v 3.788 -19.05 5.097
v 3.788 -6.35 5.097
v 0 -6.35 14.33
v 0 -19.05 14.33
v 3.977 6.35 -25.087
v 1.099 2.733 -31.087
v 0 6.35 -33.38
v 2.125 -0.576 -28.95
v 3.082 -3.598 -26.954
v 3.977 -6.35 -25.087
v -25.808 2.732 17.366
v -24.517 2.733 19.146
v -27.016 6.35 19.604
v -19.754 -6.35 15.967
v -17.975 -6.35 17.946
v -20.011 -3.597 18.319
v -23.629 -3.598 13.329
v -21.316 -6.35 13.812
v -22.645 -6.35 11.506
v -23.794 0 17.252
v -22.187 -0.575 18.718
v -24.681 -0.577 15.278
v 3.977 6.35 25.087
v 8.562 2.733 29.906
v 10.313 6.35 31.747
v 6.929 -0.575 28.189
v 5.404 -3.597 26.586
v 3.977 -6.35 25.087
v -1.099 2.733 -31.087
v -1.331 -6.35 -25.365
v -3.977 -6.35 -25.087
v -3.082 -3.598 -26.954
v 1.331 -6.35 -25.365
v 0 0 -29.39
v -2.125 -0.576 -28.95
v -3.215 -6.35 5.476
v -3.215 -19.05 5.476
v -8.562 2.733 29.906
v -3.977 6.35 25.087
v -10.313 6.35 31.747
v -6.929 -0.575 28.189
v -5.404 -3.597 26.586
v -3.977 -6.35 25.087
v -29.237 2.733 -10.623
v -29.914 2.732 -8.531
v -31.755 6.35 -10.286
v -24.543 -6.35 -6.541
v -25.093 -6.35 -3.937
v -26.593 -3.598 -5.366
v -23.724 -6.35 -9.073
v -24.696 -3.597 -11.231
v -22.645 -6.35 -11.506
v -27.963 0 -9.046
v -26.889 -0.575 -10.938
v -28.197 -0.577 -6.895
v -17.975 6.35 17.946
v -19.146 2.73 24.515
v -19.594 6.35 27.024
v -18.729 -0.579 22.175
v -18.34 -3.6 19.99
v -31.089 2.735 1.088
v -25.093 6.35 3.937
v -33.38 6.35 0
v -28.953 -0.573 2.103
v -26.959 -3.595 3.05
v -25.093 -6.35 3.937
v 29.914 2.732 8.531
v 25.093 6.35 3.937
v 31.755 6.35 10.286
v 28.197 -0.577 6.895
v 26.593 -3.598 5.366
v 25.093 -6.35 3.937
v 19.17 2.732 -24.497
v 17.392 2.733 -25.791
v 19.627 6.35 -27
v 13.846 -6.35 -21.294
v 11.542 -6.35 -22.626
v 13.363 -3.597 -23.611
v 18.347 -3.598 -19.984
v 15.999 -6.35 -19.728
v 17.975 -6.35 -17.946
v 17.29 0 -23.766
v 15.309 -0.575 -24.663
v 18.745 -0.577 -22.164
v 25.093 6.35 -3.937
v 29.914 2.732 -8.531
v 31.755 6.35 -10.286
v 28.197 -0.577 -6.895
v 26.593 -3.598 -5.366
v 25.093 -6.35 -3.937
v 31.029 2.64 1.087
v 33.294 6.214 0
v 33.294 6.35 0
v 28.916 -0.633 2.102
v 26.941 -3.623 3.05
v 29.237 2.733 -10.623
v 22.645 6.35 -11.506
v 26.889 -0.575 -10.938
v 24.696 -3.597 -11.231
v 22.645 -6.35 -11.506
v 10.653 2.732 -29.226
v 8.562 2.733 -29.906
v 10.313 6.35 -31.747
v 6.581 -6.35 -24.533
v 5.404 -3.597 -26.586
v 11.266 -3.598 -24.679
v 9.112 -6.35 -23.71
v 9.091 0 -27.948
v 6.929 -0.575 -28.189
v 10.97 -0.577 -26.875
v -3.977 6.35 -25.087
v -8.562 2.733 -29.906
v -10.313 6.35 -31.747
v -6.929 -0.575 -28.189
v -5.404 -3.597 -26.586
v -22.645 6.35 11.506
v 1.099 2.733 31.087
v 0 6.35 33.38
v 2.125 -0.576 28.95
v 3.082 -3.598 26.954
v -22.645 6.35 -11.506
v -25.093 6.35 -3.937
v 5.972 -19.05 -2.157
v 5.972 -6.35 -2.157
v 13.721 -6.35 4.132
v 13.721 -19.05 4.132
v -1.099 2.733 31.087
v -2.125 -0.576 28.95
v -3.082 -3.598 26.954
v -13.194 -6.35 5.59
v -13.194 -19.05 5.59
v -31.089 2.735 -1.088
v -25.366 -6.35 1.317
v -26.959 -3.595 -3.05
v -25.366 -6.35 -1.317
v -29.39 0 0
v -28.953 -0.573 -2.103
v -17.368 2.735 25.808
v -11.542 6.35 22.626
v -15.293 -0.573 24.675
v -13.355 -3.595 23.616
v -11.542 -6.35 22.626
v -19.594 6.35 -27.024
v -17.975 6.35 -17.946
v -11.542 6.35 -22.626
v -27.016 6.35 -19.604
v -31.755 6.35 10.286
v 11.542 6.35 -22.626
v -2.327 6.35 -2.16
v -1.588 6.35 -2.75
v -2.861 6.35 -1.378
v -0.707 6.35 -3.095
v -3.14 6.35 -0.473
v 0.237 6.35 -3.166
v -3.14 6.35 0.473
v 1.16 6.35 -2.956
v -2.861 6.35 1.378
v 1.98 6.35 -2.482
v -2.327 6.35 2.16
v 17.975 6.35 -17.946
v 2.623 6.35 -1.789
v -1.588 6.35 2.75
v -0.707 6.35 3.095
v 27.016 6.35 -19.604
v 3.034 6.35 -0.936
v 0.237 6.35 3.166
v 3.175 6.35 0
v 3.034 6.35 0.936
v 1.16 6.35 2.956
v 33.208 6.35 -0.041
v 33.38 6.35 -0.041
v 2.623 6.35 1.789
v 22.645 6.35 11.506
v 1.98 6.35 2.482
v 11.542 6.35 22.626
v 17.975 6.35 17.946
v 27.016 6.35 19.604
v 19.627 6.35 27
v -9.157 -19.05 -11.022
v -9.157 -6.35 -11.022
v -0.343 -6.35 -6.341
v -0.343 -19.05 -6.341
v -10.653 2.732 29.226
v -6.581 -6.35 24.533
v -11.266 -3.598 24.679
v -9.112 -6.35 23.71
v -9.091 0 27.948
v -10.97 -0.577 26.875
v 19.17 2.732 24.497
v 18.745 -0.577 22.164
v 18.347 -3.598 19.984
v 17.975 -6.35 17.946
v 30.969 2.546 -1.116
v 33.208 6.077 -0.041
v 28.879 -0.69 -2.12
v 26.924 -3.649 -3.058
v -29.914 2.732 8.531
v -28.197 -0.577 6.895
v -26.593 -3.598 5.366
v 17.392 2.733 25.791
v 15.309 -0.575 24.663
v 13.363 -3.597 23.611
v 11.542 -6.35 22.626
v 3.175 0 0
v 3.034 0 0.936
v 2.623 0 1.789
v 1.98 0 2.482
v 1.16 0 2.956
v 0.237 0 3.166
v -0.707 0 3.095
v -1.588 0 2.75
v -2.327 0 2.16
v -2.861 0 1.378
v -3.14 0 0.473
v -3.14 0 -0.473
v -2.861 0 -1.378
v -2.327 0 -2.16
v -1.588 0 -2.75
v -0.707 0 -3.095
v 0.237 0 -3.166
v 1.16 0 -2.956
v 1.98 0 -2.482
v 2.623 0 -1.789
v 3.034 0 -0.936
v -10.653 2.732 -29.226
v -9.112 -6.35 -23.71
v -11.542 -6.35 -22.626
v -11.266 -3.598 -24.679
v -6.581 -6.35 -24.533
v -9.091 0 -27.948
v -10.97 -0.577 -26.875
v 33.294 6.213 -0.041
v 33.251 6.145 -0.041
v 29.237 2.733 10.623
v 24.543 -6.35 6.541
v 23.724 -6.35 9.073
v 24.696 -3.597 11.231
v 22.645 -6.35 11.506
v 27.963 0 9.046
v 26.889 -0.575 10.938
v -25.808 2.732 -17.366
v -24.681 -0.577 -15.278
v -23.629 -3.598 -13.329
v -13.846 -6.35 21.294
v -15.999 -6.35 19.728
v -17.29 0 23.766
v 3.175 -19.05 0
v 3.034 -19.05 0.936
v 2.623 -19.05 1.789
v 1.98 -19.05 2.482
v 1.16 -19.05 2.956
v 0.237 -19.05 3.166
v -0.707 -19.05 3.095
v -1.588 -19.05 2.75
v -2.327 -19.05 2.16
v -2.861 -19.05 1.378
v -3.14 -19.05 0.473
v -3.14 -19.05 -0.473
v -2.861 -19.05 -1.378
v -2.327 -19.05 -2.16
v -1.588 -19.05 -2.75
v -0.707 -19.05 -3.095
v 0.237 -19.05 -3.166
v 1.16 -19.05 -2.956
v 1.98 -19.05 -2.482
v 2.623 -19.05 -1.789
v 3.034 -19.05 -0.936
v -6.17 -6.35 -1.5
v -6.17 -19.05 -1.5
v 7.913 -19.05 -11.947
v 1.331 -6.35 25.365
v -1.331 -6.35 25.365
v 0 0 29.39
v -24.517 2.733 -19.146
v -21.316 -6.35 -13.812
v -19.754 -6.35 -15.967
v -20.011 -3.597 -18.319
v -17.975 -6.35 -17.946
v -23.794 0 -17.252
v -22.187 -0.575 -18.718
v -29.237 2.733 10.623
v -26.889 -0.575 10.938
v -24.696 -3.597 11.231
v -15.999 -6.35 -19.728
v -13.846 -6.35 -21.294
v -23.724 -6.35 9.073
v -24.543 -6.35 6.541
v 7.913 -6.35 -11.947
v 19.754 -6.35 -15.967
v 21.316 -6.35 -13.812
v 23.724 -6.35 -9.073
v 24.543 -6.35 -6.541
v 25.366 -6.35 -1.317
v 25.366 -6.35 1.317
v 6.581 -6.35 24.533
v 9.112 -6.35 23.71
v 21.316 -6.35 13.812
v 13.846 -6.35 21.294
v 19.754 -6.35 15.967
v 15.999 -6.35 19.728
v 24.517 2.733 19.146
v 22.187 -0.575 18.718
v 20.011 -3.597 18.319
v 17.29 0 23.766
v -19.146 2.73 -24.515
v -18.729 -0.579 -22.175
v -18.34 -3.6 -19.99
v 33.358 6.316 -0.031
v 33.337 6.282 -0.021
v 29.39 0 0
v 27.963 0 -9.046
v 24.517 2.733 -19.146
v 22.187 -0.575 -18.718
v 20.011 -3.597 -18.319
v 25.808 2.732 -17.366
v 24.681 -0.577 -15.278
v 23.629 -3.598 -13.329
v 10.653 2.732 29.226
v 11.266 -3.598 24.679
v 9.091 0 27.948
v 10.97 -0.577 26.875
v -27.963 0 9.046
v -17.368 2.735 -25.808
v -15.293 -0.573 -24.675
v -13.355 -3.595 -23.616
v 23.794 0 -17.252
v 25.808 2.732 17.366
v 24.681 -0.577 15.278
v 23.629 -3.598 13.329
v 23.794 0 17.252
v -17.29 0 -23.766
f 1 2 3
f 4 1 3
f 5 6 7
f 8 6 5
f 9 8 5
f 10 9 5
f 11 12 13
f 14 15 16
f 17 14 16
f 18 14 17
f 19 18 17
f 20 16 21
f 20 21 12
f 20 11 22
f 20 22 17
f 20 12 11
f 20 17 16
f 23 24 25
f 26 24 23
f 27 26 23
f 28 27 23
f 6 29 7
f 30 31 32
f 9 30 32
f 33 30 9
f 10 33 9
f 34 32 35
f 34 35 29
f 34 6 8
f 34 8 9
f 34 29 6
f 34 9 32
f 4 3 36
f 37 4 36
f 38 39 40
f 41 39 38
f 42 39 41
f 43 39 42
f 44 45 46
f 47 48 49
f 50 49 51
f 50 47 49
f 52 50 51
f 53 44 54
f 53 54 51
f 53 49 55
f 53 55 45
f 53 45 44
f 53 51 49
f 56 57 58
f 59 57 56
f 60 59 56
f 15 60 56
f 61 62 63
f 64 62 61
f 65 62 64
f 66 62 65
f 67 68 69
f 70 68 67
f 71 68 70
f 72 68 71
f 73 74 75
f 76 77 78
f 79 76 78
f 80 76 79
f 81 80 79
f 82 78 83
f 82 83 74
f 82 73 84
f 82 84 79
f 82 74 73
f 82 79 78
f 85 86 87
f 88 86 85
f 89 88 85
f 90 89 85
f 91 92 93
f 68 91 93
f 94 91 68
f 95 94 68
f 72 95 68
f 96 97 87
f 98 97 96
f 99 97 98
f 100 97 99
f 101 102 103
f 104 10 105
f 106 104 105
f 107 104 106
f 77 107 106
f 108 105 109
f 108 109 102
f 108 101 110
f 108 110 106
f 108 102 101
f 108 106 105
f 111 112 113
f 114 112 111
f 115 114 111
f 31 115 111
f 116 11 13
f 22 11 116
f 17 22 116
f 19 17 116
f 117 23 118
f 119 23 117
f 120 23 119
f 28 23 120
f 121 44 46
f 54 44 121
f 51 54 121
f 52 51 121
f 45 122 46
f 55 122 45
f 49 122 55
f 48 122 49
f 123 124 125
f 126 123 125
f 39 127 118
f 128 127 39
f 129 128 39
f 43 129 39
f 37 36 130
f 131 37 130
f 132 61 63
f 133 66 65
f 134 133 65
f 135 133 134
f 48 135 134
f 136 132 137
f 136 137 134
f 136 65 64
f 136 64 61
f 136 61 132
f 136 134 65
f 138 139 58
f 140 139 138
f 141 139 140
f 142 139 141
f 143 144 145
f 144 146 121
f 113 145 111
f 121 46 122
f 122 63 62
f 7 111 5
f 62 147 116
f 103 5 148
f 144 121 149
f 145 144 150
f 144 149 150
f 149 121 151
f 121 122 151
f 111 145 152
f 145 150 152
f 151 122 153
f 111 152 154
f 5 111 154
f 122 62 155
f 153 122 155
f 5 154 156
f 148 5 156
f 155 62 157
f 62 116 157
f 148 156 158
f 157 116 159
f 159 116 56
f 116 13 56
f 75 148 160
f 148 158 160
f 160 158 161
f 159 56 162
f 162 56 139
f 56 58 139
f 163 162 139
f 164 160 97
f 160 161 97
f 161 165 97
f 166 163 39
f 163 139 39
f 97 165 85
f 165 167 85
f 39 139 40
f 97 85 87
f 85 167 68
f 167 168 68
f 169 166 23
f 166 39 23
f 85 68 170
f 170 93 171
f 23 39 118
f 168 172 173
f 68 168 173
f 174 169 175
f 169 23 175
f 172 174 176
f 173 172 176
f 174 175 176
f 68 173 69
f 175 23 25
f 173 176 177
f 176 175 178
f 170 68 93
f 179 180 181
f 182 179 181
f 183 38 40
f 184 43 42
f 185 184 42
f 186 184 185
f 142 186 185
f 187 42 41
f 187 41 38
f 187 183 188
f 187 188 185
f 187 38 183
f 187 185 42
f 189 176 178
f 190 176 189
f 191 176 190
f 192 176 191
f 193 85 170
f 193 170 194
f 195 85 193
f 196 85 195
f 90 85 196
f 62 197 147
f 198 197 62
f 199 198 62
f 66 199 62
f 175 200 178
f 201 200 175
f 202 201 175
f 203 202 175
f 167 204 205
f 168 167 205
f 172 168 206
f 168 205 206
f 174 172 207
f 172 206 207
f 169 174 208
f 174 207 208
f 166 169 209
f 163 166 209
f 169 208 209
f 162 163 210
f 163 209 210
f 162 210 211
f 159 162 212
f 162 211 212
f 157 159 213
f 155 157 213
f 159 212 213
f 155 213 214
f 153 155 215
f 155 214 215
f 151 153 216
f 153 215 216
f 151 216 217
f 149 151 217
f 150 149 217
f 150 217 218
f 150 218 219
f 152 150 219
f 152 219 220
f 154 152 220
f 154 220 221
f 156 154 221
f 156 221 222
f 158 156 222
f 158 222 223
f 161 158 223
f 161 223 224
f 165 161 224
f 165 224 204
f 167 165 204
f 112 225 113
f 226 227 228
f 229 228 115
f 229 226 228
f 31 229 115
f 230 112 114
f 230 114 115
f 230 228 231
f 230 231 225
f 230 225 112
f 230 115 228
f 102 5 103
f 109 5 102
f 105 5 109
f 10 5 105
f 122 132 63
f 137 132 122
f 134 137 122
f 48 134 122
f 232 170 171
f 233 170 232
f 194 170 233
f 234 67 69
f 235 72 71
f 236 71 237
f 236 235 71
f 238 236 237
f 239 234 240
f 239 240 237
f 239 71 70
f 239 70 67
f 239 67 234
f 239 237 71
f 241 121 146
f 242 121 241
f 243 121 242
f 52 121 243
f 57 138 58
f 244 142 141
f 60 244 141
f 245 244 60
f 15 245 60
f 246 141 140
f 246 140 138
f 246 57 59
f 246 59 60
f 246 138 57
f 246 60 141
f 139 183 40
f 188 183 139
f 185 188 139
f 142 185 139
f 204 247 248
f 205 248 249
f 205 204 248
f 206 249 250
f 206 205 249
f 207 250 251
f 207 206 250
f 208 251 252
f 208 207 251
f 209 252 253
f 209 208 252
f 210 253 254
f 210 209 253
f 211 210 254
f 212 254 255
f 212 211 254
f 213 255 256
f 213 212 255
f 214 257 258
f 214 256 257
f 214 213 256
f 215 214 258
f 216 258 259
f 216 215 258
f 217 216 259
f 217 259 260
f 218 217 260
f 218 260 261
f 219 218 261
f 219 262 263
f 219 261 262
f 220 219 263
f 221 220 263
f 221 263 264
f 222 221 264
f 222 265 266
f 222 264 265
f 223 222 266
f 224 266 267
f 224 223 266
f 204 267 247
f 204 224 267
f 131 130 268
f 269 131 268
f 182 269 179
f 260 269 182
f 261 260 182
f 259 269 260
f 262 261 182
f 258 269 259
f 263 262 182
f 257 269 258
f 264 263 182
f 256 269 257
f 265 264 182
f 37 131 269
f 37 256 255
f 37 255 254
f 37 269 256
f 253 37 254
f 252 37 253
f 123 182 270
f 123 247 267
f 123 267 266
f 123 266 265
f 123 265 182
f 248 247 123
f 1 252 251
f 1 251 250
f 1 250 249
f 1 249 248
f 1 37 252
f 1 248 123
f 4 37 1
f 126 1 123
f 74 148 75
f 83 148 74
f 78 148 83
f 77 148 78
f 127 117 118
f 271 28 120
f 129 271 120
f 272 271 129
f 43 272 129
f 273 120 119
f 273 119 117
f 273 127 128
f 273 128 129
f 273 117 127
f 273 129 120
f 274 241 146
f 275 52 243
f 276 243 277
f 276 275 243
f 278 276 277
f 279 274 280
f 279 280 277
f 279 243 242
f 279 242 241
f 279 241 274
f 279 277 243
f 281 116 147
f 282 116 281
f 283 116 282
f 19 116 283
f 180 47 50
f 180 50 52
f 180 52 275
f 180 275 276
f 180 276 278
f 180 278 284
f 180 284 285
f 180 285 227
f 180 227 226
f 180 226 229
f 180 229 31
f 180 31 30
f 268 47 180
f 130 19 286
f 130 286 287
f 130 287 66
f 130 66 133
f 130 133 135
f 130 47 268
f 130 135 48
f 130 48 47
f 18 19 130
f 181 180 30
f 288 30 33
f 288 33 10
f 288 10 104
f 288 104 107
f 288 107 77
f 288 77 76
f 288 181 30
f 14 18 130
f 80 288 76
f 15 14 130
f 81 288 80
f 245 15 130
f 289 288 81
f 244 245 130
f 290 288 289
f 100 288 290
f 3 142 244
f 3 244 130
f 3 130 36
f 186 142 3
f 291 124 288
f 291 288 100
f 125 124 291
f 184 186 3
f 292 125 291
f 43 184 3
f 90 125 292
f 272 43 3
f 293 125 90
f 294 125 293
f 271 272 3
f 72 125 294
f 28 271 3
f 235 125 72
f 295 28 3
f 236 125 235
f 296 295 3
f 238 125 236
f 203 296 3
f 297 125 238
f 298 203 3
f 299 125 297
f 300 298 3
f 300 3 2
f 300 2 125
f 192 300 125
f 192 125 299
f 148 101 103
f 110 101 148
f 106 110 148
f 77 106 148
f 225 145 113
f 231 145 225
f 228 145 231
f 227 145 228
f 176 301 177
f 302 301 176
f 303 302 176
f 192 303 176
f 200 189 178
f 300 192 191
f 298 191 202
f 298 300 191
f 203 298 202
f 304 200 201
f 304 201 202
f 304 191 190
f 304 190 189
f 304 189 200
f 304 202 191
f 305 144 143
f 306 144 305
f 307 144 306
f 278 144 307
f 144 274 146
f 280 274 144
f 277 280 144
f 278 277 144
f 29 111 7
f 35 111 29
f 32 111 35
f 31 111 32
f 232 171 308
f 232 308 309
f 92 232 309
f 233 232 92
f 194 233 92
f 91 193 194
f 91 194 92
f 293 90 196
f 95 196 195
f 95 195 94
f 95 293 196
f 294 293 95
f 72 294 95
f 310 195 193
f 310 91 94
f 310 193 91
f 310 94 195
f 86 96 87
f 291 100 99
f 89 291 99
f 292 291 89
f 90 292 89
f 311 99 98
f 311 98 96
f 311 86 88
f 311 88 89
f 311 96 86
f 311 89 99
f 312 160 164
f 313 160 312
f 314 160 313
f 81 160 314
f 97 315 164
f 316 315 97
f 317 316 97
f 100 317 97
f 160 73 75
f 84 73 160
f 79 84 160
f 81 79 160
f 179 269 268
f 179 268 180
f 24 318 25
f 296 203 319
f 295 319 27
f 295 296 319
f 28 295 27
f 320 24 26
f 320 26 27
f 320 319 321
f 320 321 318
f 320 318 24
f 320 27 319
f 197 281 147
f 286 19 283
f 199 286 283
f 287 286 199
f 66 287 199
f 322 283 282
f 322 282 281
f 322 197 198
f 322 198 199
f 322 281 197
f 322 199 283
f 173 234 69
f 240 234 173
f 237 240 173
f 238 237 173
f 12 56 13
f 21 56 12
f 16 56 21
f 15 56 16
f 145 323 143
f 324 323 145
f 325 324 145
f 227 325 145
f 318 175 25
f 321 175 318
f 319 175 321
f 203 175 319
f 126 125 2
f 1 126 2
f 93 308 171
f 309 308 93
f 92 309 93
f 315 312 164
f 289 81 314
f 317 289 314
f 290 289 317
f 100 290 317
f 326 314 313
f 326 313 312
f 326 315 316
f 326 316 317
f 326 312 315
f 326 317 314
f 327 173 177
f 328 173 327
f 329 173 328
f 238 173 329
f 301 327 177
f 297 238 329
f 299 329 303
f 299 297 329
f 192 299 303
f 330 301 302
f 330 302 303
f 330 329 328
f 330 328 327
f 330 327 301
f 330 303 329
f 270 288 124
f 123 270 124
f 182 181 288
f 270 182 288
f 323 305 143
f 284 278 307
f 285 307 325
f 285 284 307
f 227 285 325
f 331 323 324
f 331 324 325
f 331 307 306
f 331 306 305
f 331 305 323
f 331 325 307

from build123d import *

# Parameters (mm, degrees)
F1_DEPTH = 6.35
F6_DEPTH = 12.7
F5_R     = 3.175
F7_DEPTH = 63.5


with BuildPart() as f1:
    # F0 (on Front) → F1 (new body, symmetric)
    with BuildSketch(Plane.XZ):
        with BuildLine():
            ThreePointArc((25.3999666944, -0.0411329817), (25.3999916736, -0.0205664976), (25.4, 0))
            ThreePointArc((25.4, 0), (25.3231458192, 1.9744077138), (25.0930483606, 3.9368672789))
            ThreePointArc((25.0930483606, 3.9368672789), (24.706334539, 5.8955096173), (24.1669838755, 7.8177292331))
            Line((24.1669838755, 7.8177292331), (0.0326778328, -0.0326249568))
            Line((0.0326778328, -0.0326249568), (0.0299255888, -0.0411329817))
            Line((0.0299255888, -0.0411329817), (25.3999666944, -0.0411329817))
        make_face()
        with BuildLine():
            ThreePointArc((25.0930483606, 3.9368672789), (25.3231458192, 1.9744077138), (25.4, 0))
            ThreePointArc((25.4, 0), (25.3999916736, -0.0205664976), (25.3999666944, -0.0411329817))
            Line((25.3999666944, -0.0411329817), (33.2082439851, -0.0411329817))
            Line((33.2082439851, -0.0411329817), (33.2939280097, 0))
            Line((33.2939280097, 0), (25.0930483606, 3.9368672789))
        make_face()
        with BuildLine():
            ThreePointArc((24.1669838755, 7.8177292331), (24.706334539, 5.8955096173), (25.0930483606, 3.9368672789))
            Line((25.0930483606, 3.9368672789), (31.7552785313, 10.2860330974))
            Line((31.7552785313, 10.2860330974), (24.1669838755, 7.8177292331))
        make_face()
        with BuildLine():
            Line((33.2082439851, -0.0411329817), (25.3999666944, -0.0411329817))
            ThreePointArc((25.3999666944, -0.0411329817), (25.3215388309, -1.994911335), (25.0930483606, -3.9368672789))
            Line((25.0930483606, -3.9368672789), (33.2082439851, -0.0411329817))
        make_face()
        with BuildLine():
            ThreePointArc((25.0930483606, -3.9368672789), (25.3215388309, -1.994911335), (25.3999666944, -0.0411329817))
            Line((25.3999666944, -0.0411329817), (0.0299255888, -0.0411329817))
            Line((0.0299255888, -0.0411329817), (0.0264556072, -0.0518597526))
            Line((0.0264556072, -0.0518597526), (24.1415369557, -7.895960576))
            ThreePointArc((24.1415369557, -7.895960576), (24.6967549032, -5.9355115407), (25.0930483606, -3.9368672789))
        make_face()
        with BuildLine():
            Line((0.0326778328, -0.0326249568), (24.1669838755, 7.8177292331))
            ThreePointArc((24.1669838755, 7.8177292331), (23.4783285027, 9.6916505673), (22.6446229644, 11.5056964501))
            ThreePointArc((22.6446229644, 11.5056964501), (21.6710179307, 13.2486596246), (20.5635283771, 14.9097719863))
            Line((20.5635283771, 14.9097719863), (0.0350181754, -0.0253902444))
            Line((0.0350181754, -0.0253902444), (0.0326778328, -0.0326249568))
        make_face()
        with BuildLine():
            ThreePointArc((22.6446229644, 11.5056964501), (23.4783285027, 9.6916505673), (24.1669838755, 7.8177292331))
            Line((24.1669838755, 7.8177292331), (31.7552785313, 10.2860330974))
            Line((31.7552785313, 10.2860330974), (22.6446229644, 11.5056964501))
        make_face()
        Polygon((33.3796120343, -0.0411329817), (33.2939280097, 0), (33.2082439851, -0.0411329817), align=None)
        with BuildLine():
            Line((31.7552785313, -10.2860330974), (25.0930483606, -3.9368672789))
            ThreePointArc((25.0930483606, -3.9368672789), (24.6967549032, -5.9355115407), (24.1415369557, -7.895960576))
            ThreePointArc((24.1415369557, -7.895960576), (23.4626029734, -9.7296588694), (22.6446229644, -11.5056964501))
            Line((22.6446229644, -11.5056964501), (31.7552785313, -10.2860330974))
        make_face()
        with BuildLine():
            ThreePointArc((20.5635283771, 14.9097719863), (21.6710179307, 13.2486596246), (22.6446229644, 11.5056964501))
            Line((22.6446229644, 11.5056964501), (27.0161574965, 19.6042705962))
            Line((27.0161574965, 19.6042705962), (20.5635283771, 14.9097719863))
        make_face()
        with BuildLine():
            ThreePointArc((22.6446229644, -11.5056964501), (23.4626029734, -9.7296588694), (24.1415369557, -7.895960576))
            Line((24.1415369557, -7.895960576), (0.0264556072, -0.0518597526))
            Line((0.0264556072, -0.0518597526), (0.0216754409, -0.0666367035))
            Line((0.0216754409, -0.0666367035), (20.5151305555, -14.9762952125))
            ThreePointArc((20.5151305555, -14.9762952125), (21.6495345196, -13.283736488), (22.6446229644, -11.5056964501))
        make_face()
        with BuildLine():
            Line((0.0350181754, -0.0253902444), (20.5635283771, 14.9097719863))
            ThreePointArc((20.5635283771, 14.9097719863), (19.3289964238, 16.4787711086), (17.9750490644, 17.9459636446))
            ThreePointArc((17.9750490644, 17.9459636446), (16.5100510465, 19.302285213), (14.9430531934, 20.5393563984))
            Line((14.9430531934, 20.5393563984), (0.0371289603, -0.0188651649))
            Line((0.0371289603, -0.0188651649), (0.0350181754, -0.0253902444))
        make_face()
        with BuildLine():
            ThreePointArc((17.9750490644, 17.9459636446), (19.3289964238, 16.4787711086), (20.5635283771, 14.9097719863))
            Line((20.5635283771, 14.9097719863), (27.0161574965, 19.6042705962))
            Line((27.0161574965, 19.6042705962), (17.9750490644, 17.9459636446))
        make_face()
        with BuildLine():
            Line((27.0161574965, -19.6042705962), (22.6446229644, -11.5056964501))
            ThreePointArc((22.6446229644, -11.5056964501), (21.6495345196, -13.283736488), (20.5151305555, -14.9762952125))
            ThreePointArc((20.5151305555, -14.9762952125), (19.302285213, -16.5100510465), (17.9750490644, -17.9459636446))
            Line((17.9750490644, -17.9459636446), (27.0161574965, -19.6042705962))
        make_face()
        with BuildLine():
            Line((20.5151305555, -14.9762952125), (0.0216754409, -0.0666367035))
            Line((0.0216754409, -0.0666367035), (0.0142195958, -0.0896849932))
            Line((0.0142195958, -0.0896849932), (14.8764516786, -20.5876464282))
            ThreePointArc((14.8764516786, -20.5876464282), (16.4787711086, -19.3289964238), (17.9750490644, -17.9459636446))
            ThreePointArc((17.9750490644, -17.9459636446), (19.302285213, -16.5100510465), (20.5151305555, -14.9762952125))
        make_face()
        with BuildLine():
            ThreePointArc((14.9430531934, 20.5393563984), (16.5100510465, 19.302285213), (17.9750490644, 17.9459636446))
            Line((17.9750490644, 17.9459636446), (19.6270962066, 26.9995793667))
            Line((19.6270962066, 26.9995793667), (14.9430531934, 20.5393563984))
        make_face()
        with BuildLine():
            Line((0.0294725544, -0.0294248649), (0.0371289603, -0.0188651649))
            Line((0.0371289603, -0.0188651649), (7.8568552068, 24.1542920877))
            ThreePointArc((7.8568552068, 24.1542920877), (5.9355115407, 24.6967549032), (3.9774980183, 25.0866400603))
            ThreePointArc((3.9774980183, 25.0866400603), (1.994911335, 25.3215388309), (0, 25.4))
            Line((0, 25.4), (-0.041143489, -0.006455033))
            Line((-0.041143489, -0.006455033), (-0.0371289603, -0.0188651649))
            Line((-0.0371289603, -0.0188651649), (-0.0294725544, -0.0294248649))
            Line((-0.0294725544, -0.0294248649), (-0.0189252671, -0.0370983612))
            Line((-0.0189252671, -0.0370983612), (-0.0065216527, -0.0411329817))
            Line((-0.0065216527, -0.0411329817), (0.0065216527, -0.0411329817))
            Line((0.0065216527, -0.0411329817), (0.0189252671, -0.0370983612))
            Line((0.0189252671, -0.0370983612), (0.0294725544, -0.0294248649))
        make_face()
        with BuildLine():
            Line((7.8568552068, 24.1542920877), (0.0371289603, -0.0188651649))
            Line((0.0371289603, -0.0188651649), (14.9430531934, 20.5393563984))
            ThreePointArc((14.9430531934, 20.5393563984), (13.283736488, 21.6495345196), (11.5423522634, 22.6259608465))
            ThreePointArc((11.5423522634, 22.6259608465), (9.7296588694, 23.4626029734), (7.8568552068, 24.1542920877))
        make_face()
        with BuildLine():
            Line((14.8764516786, -20.5876464282), (0.0142195958, -0.0896849932))
            Line((0.0142195958, -0.0896849932), (0, -0.133642098))
            Line((0, -0.133642098), (7.7785827575, -24.1796122857))
            ThreePointArc((7.7785827575, -24.1796122857), (9.6916505673, -23.4783285027), (11.5423522634, -22.6259608465))
            ThreePointArc((11.5423522634, -22.6259608465), (13.2486596246, -21.6710179307), (14.8764516786, -20.5876464282))
        make_face()
        with BuildLine():
            ThreePointArc((11.5423522634, 22.6259608465), (13.283736488, 21.6495345196), (14.9430531934, 20.5393563984))
            Line((14.9430531934, 20.5393563984), (19.6270962066, 26.9995793667))
            Line((19.6270962066, 26.9995793667), (11.5423522634, 22.6259608465))
        make_face()
        with BuildLine():
            Line((10.3128672742, 31.7465739895), (7.8568552068, 24.1542920877))
            ThreePointArc((7.8568552068, 24.1542920877), (9.7296588694, 23.4626029734), (11.5423522634, 22.6259608465))
            Line((11.5423522634, 22.6259608465), (10.3128672742, 31.7465739895))
        make_face()
        with BuildLine():
            ThreePointArc((3.9774980183, 25.0866400603), (5.9355115407, 24.6967549032), (7.8568552068, 24.1542920877))
            Line((7.8568552068, 24.1542920877), (10.3128672742, 31.7465739895))
            Line((10.3128672742, 31.7465739895), (3.9774980183, 25.0866400603))
        make_face()
        with BuildLine():
            Line((19.6270962066, -26.9995793667), (17.9750490644, -17.9459636446))
            ThreePointArc((17.9750490644, -17.9459636446), (16.4787711086, -19.3289964238), (14.8764516786, -20.5876464282))
            ThreePointArc((14.8764516786, -20.5876464282), (13.2486596246, -21.6710179307), (11.5423522634, -22.6259608465))
            Line((11.5423522634, -22.6259608465), (19.6270962066, -26.9995793667))
        make_face()
        with BuildLine():
            Line((7.7785827575, -24.1796122857), (0, -0.133642098))
            Line((0, -0.133642098), (-0.0415574978, -0.2621089903))
            Line((-0.0415574978, -0.2621089903), (-0.0822658556, -25.3998667778))
            ThreePointArc((-0.0822658556, -25.3998667778), (1.9539027981, -25.3247362051), (3.9774980183, -25.0866400603))
            ThreePointArc((3.9774980183, -25.0866400603), (5.8955096173, -24.706334539), (7.7785827575, -24.1796122857))
        make_face()
        with BuildLine():
            ThreePointArc((0, 25.4), (1.994911335, 25.3215388309), (3.9774980183, 25.0866400603))
            Line((3.9774980183, 25.0866400603), (0, 33.3796453399))
            Line((0, 33.3796453399), (0, 25.4))
        make_face()
        with BuildLine():
            Line((-7.7785827575, -24.1796122857), (-0.0415574978, -0.2621089903))
            Line((-0.0415574978, -0.2621089903), (-0.041338843, -0.1270878059))
            Line((-0.041338843, -0.1270878059), (-14.8764516786, -20.5876464282))
            ThreePointArc((-14.8764516786, -20.5876464282), (-13.2486596246, -21.6710179307), (-11.5423522634, -22.6259608465))
            ThreePointArc((-11.5423522634, -22.6259608465), (-9.6916505673, -23.4783285027), (-7.7785827575, -24.1796122857))
        make_face()
        with BuildLine():
            Line((-0.0822658556, -25.3998667778), (-0.0415574978, -0.2621089903))
            Line((-0.0415574978, -0.2621089903), (-7.7785827575, -24.1796122857))
            ThreePointArc((-7.7785827575, -24.1796122857), (-5.8955096173, -24.706334539), (-3.9774980183, -25.0866400603))
            ThreePointArc((-3.9774980183, -25.0866400603), (-2.0359146402, -25.3182750514), (-0.0822658556, -25.3998667778))
        make_face()
        with BuildLine():
            ThreePointArc((11.5423522634, -22.6259608465), (9.6916505673, -23.4783285027), (7.7785827575, -24.1796122857))
            ThreePointArc((7.7785827575, -24.1796122857), (5.8955096173, -24.706334539), (3.9774980183, -25.0866400603))
            Line((3.9774980183, -25.0866400603), (10.3128672742, -31.7465739895))
            Line((10.3128672742, -31.7465739895), (11.5423522634, -22.6259608465))
        make_face()
        with BuildLine():
            Line((-0.041143489, -0.006455033), (0, 25.4))
            ThreePointArc((0, 25.4), (-1.994911335, 25.3215388309), (-3.9774980183, 25.0866400603))
            ThreePointArc((-3.9774980183, 25.0866400603), (-5.9355115407, 24.6967549032), (-7.8568552068, 24.1542920877))
            Line((-7.8568552068, 24.1542920877), (-0.041143489, -0.006455033))
        make_face()
        with BuildLine():
            ThreePointArc((-3.9774980183, 25.0866400603), (-1.994911335, 25.3215388309), (0, 25.4))
            Line((0, 25.4), (0, 33.3796453399))
            Line((0, 33.3796453399), (-3.9774980183, 25.0866400603))
        make_face()
        with BuildLine():
            Line((-14.8764516786, -20.5876464282), (-0.041338843, -0.1270878059))
            Line((-0.041338843, -0.1270878059), (-0.0412640266, -0.08088804))
            Line((-0.0412640266, -0.08088804), (-20.5151305555, -14.9762952125))
            ThreePointArc((-20.5151305555, -14.9762952125), (-19.302285213, -16.5100510465), (-17.9750490644, -17.9459636446))
            ThreePointArc((-17.9750490644, -17.9459636446), (-16.4787711086, -19.3289964238), (-14.8764516786, -20.5876464282))
        make_face()
        with BuildLine():
            ThreePointArc((3.9774980183, -25.0866400603), (1.9539027981, -25.3247362051), (-0.0822658556, -25.3998667778))
            ThreePointArc((-0.0822658556, -25.3998667778), (-2.0359146402, -25.3182750514), (-3.9774980183, -25.0866400603))
            Line((-3.9774980183, -25.0866400603), (0, -33.3796453399))
            Line((0, -33.3796453399), (3.9774980183, -25.0866400603))
        make_face()
        with BuildLine():
            ThreePointArc((-3.9774980183, -25.0866400603), (-5.8955096173, -24.706334539), (-7.7785827575, -24.1796122857))
            ThreePointArc((-7.7785827575, -24.1796122857), (-9.6916505673, -23.4783285027), (-11.5423522634, -22.6259608465))
            Line((-11.5423522634, -22.6259608465), (-10.3128672794, -31.7465739878))
            Line((-10.3128672794, -31.7465739878), (-3.9774980183, -25.0866400603))
        make_face()
        with BuildLine():
            ThreePointArc((-7.8568552068, 24.1542920877), (-5.9355115407, 24.6967549032), (-3.9774980183, 25.0866400603))
            Line((-3.9774980183, 25.0866400603), (-10.3128672794, 31.7465739878))
            Line((-10.3128672794, 31.7465739878), (-7.8568552068, 24.1542920877))
        make_face()
        with BuildLine():
            Line((-0.0411545949, -0.0133130175), (-0.041143489, -0.006455033))
            Line((-0.041143489, -0.006455033), (-7.8568552068, 24.1542920877))
            ThreePointArc((-7.8568552068, 24.1542920877), (-9.7296588694, 23.4626029734), (-11.5423522634, 22.6259608465))
            ThreePointArc((-11.5423522634, 22.6259608465), (-13.283736488, 21.6495345196), (-14.9430531934, 20.5393563984))
            Line((-14.9430531934, 20.5393563984), (-0.0411545949, -0.0133130175))
        make_face()
        with BuildLine():
            Line((-20.5151305555, -14.9762952125), (-0.0412640266, -0.08088804))
            Line((-0.0412640266, -0.08088804), (-0.0412247977, -0.0566638425))
            Line((-0.0412247977, -0.0566638425), (-24.1415369557, -7.895960576))
            ThreePointArc((-24.1415369557, -7.895960576), (-23.4626029734, -9.7296588694), (-22.6446229644, -11.5056964501))
            ThreePointArc((-22.6446229644, -11.5056964501), (-21.6495345196, -13.283736488), (-20.5151305555, -14.9762952125))
        make_face()
        with BuildLine():
            ThreePointArc((-11.5423522634, -22.6259608465), (-13.2486596246, -21.6710179307), (-14.8764516786, -20.5876464282))
            ThreePointArc((-14.8764516786, -20.5876464282), (-16.4787711086, -19.3289964238), (-17.9750490644, -17.9459636446))
            Line((-17.9750490644, -17.9459636446), (-19.5937332182, -27.0236385527))
            Line((-19.5937332182, -27.0236385527), (-11.5423522634, -22.6259608465))
        make_face()
        with BuildLine():
            ThreePointArc((-11.5423522634, 22.6259608465), (-9.7296588694, 23.4626029734), (-7.8568552068, 24.1542920877))
            Line((-7.8568552068, 24.1542920877), (-10.3128672794, 31.7465739878))
            Line((-10.3128672794, 31.7465739878), (-11.5423522634, 22.6259608465))
        make_face()
        with BuildLine():
            Line((-0.0411669086, -0.02091684), (-0.0411545949, -0.0133130175))
            Line((-0.0411545949, -0.0133130175), (-14.9430531934, 20.5393563984))
            ThreePointArc((-14.9430531934, 20.5393563984), (-16.5100510465, 19.302285213), (-17.9750490644, 17.9459636446))
            ThreePointArc((-17.9750490644, 17.9459636446), (-19.3289964238, 16.4787711086), (-20.5635283771, 14.9097719863))
            Line((-20.5635283771, 14.9097719863), (-0.0411669086, -0.02091684))
        make_face()
        with BuildLine():
            Line((-24.1415369557, -7.895960576), (-0.0412247977, -0.0566638425))
            Line((-0.0412247977, -0.0566638425), (-0.0411996469, -0.0411329817))
            Line((-0.0411996469, -0.0411329817), (-25.3999666944, -0.0411329817))
            ThreePointArc((-25.3999666944, -0.0411329817), (-25.3215388309, -1.994911335), (-25.0930483606, -3.9368672789))
            ThreePointArc((-25.0930483606, -3.9368672789), (-24.6967549032, -5.9355115407), (-24.1415369557, -7.895960576))
        make_face()
        with BuildLine():
            ThreePointArc((-17.9750490644, -17.9459636446), (-19.302285213, -16.5100510465), (-20.5151305555, -14.9762952125))
            ThreePointArc((-20.5151305555, -14.9762952125), (-21.6495345196, -13.283736488), (-22.6446229644, -11.5056964501))
            Line((-22.6446229644, -11.5056964501), (-27.0161574965, -19.6042705962))
            Line((-27.0161574965, -19.6042705962), (-17.9750490644, -17.9459636446))
        make_face()
        with BuildLine():
            Line((-25.3999666944, -0.0411329817), (-0.0411996469, -0.0411329817))
            Line((-0.0411996469, -0.0411329817), (-0.0411813896, -0.0298589385))
            Line((-0.0411813896, -0.0298589385), (-24.1669838755, 7.8177292331))
            ThreePointArc((-24.1669838755, 7.8177292331), (-24.706334539, 5.8955096173), (-25.0930483606, 3.9368672789))
            ThreePointArc((-25.0930483606, 3.9368672789), (-25.3247362051, 1.9539027981), (-25.3999666944, -0.0411329817))
        make_face()
        with BuildLine():
            Line((-24.1669838755, 7.8177292331), (-0.0411813896, -0.0298589385))
            Line((-0.0411813896, -0.0298589385), (-0.0411669086, -0.02091684))
            Line((-0.0411669086, -0.02091684), (-20.5635283771, 14.9097719863))
            ThreePointArc((-20.5635283771, 14.9097719863), (-21.6710179307, 13.2486596246), (-22.6446229644, 11.5056964501))
            ThreePointArc((-22.6446229644, 11.5056964501), (-23.4783285027, 9.6916505673), (-24.1669838755, 7.8177292331))
        make_face()
        with BuildLine():
            ThreePointArc((-14.9430531934, 20.5393563984), (-13.283736488, 21.6495345196), (-11.5423522634, 22.6259608465))
            Line((-11.5423522634, 22.6259608465), (-19.5937332182, 27.0236385527))
            Line((-19.5937332182, 27.0236385527), (-14.9430531934, 20.5393563984))
        make_face()
        with BuildLine():
            ThreePointArc((-17.9750490644, 17.9459636446), (-16.5100510465, 19.302285213), (-14.9430531934, 20.5393563984))
            Line((-14.9430531934, 20.5393563984), (-19.5937332182, 27.0236385527))
            Line((-19.5937332182, 27.0236385527), (-17.9750490644, 17.9459636446))
        make_face()
        with BuildLine():
            ThreePointArc((-22.6446229644, -11.5056964501), (-23.4626029734, -9.7296588694), (-24.1415369557, -7.895960576))
            ThreePointArc((-24.1415369557, -7.895960576), (-24.6967549032, -5.9355115407), (-25.0930483606, -3.9368672789))
            Line((-25.0930483606, -3.9368672789), (-31.7552785313, -10.2860330974))
            Line((-31.7552785313, -10.2860330974), (-22.6446229644, -11.5056964501))
        make_face()
        with BuildLine():
            Line((-33.3795060187, 0), (-25.3999666944, -0.0411329817))
            ThreePointArc((-25.3999666944, -0.0411329817), (-25.3247362051, 1.9539027981), (-25.0930483606, 3.9368672789))
            Line((-25.0930483606, 3.9368672789), (-33.3795060187, 0))
        make_face()
        with BuildLine():
            ThreePointArc((-25.0930483606, -3.9368672789), (-25.3215388309, -1.994911335), (-25.3999666944, -0.0411329817))
            Line((-25.3999666944, -0.0411329817), (-33.3795060187, 0))
            Line((-33.3795060187, 0), (-25.0930483606, -3.9368672789))
        make_face()
        with BuildLine():
            Line((-31.7552785313, 10.2860330974), (-24.1669838755, 7.8177292331))
            ThreePointArc((-24.1669838755, 7.8177292331), (-23.4783285027, 9.6916505673), (-22.6446229644, 11.5056964501))
            Line((-22.6446229644, 11.5056964501), (-31.7552785313, 10.2860330974))
        make_face()
        with BuildLine():
            ThreePointArc((-25.0930483606, 3.9368672789), (-24.706334539, 5.8955096173), (-24.1669838755, 7.8177292331))
            Line((-24.1669838755, 7.8177292331), (-31.7552785313, 10.2860330974))
            Line((-31.7552785313, 10.2860330974), (-25.0930483606, 3.9368672789))
        make_face()
        with BuildLine():
            Line((-27.0161574965, 19.6042705962), (-20.5635283771, 14.9097719863))
            ThreePointArc((-20.5635283771, 14.9097719863), (-19.3289964238, 16.4787711086), (-17.9750490644, 17.9459636446))
            Line((-17.9750490644, 17.9459636446), (-27.0161574965, 19.6042705962))
        make_face()
        with BuildLine():
            ThreePointArc((-22.6446229644, 11.5056964501), (-21.6710179307, 13.2486596246), (-20.5635283771, 14.9097719863))
            Line((-20.5635283771, 14.9097719863), (-27.0161574965, 19.6042705962))
            Line((-27.0161574965, 19.6042705962), (-22.6446229644, 11.5056964501))
        make_face()
    extrude(amount=F1_DEPTH, both=True)

    # F2 (on Right) → F3 (revolve, cut)
    with BuildSketch(Plane.YZ):
        Polygon((-6.35, -33.3796453399), (0, -33.3796453399), (6.35, -33.3796453399), (-6.35, -25.4), align=None)
    revolve(axis=Axis((0, -3.175, 0), (0, -1, 0)), mode=Mode.SUBTRACT)

    # F4 (on face) → F6 (join)
    with BuildSketch(Plane.XZ.offset(6.35)):
        with BuildLine():
            ThreePointArc((5.9723219918, -2.1572830195), (6.2548678902, -1.095046883), (6.35, 0))
            ThreePointArc((6.35, 0), (6.282204895, 0.9254197195), (6.0802671946, 1.8310791469))
            Line((6.0802671946, 1.8310791469), (0, 0))
            Line((0, 0), (3.5065985725, -5.2939839867))
            ThreePointArc((3.5065985725, -5.2939839867), (4.9922146394, -3.9243207048), (5.9723219918, -2.1572830195))
        make_face()
        with BuildLine():
            ThreePointArc((6.0802671946, 1.8310791469), (6.282204895, 0.9254197195), (6.35, 0))
            ThreePointArc((6.35, 0), (6.2548678902, -1.095046883), (5.9723219918, -2.1572830195))
            Line((5.9723219918, -2.1572830195), (13.7209562945, 4.1320810653))
            Line((13.7209562945, 4.1320810653), (6.0802671946, 1.8310791469))
        make_face()
        with BuildLine():
            Line((0, 0), (6.0802671946, 1.8310791469))
            ThreePointArc((6.0802671946, 1.8310791469), (5.1971745773, 3.6485444239), (3.787819123, 5.0965602411))
            ThreePointArc((3.787819123, 5.0965602411), (1.994911335, 6.0285013698), (0, 6.35))
            Line((0, 6.35), (0, 0))
        make_face()
        with BuildLine():
            ThreePointArc((3.787819123, 5.0965602411), (5.1971745773, 3.6485444239), (6.0802671946, 1.8310791469))
            Line((6.0802671946, 1.8310791469), (13.7209562945, 4.1320810653))
            Line((13.7209562945, 4.1320810653), (3.787819123, 5.0965602411))
        make_face()
        with BuildLine():
            Line((7.9131202982, -11.9466004668), (5.9723219918, -2.1572830195))
            ThreePointArc((5.9723219918, -2.1572830195), (4.9922146394, -3.9243207048), (3.5065985725, -5.2939839867))
            Line((3.5065985725, -5.2939839867), (7.9131202982, -11.9466004668))
        make_face()
        with BuildLine():
            ThreePointArc((0, 6.35), (1.994911335, 6.0285013698), (3.787819123, 5.0965602411))
            Line((3.787819123, 5.0965602411), (0, 14.3296453399))
            Line((0, 14.3296453399), (0, 6.35))
        make_face()
        with BuildLine():
            Line((-5.8468902963, 2.4771705358), (0, 0))
            Line((0, 0), (0, 6.35))
            ThreePointArc((0, 6.35), (-1.6659063993, 6.1275815677), (-3.2151109751, 5.4759073602))
            ThreePointArc((-3.2151109751, 5.4759073602), (-4.7726378865, 4.188606881), (-5.8468902963, 2.4771705358))
        make_face()
        with BuildLine():
            Line((3.5065985725, -5.2939839867), (0, 0))
            Line((0, 0), (-4.0579492347, -4.8842141649))
            ThreePointArc((-4.0579492347, -4.8842141649), (-2.3180753259, -5.9117701903), (-0.3434744748, -6.3407038478))
            ThreePointArc((-0.3434744748, -6.3407038478), (1.6659063993, -6.1275815677), (3.5065985725, -5.2939839867))
        make_face()
        with BuildLine():
            Line((-4.0579492347, -4.8842141649), (0, 0))
            Line((0, 0), (-5.8468902963, 2.4771705358))
            ThreePointArc((-5.8468902963, 2.4771705358), (-6.3290900379, 0.5148973609), (-6.1704098495, -1.4995140175))
            ThreePointArc((-6.1704098495, -1.4995140175), (-5.3869175937, -3.3620854896), (-4.0579492347, -4.8842141649))
        make_face()
        with BuildLine():
            Line((7.9131202982, -11.9466004668), (3.5065985725, -5.2939839867))
            ThreePointArc((3.5065985725, -5.2939839867), (1.6659063993, -6.1275815677), (-0.3434744748, -6.3407038478))
            Line((-0.3434744748, -6.3407038478), (7.9131202982, -11.9466004668))
        make_face()
        with BuildLine():
            ThreePointArc((-3.2151109751, 5.4759073602), (-1.6659063993, 6.1275815677), (0, 6.35))
            Line((0, 6.35), (0, 14.3296453399))
            Line((0, 14.3296453399), (-3.2151109751, 5.4759073602))
        make_face()
        with BuildLine():
            Line((-9.1573186362, -11.0218987004), (-4.0579492347, -4.8842141649))
            ThreePointArc((-4.0579492347, -4.8842141649), (-5.3869175937, -3.3620854896), (-6.1704098495, -1.4995140175))
            Line((-6.1704098495, -1.4995140175), (-9.1573186362, -11.0218987004))
        make_face()
        with BuildLine():
            ThreePointArc((-0.3434744748, -6.3407038478), (-2.3180753259, -5.9117701903), (-4.0579492347, -4.8842141649))
            Line((-4.0579492347, -4.8842141649), (-9.1573186362, -11.0218987004))
            Line((-9.1573186362, -11.0218987004), (-0.3434744748, -6.3407038478))
        make_face()
        with BuildLine():
            Line((-13.1943093365, 5.5900748385), (-5.8468902963, 2.4771705358))
            ThreePointArc((-5.8468902963, 2.4771705358), (-4.7726378865, 4.188606881), (-3.2151109751, 5.4759073602))
            Line((-3.2151109751, 5.4759073602), (-13.1943093365, 5.5900748385))
        make_face()
        with BuildLine():
            ThreePointArc((-6.1704098495, -1.4995140175), (-6.3290900379, 0.5148973609), (-5.8468902963, 2.4771705358))
            Line((-5.8468902963, 2.4771705358), (-13.1943093365, 5.5900748385))
            Line((-13.1943093365, 5.5900748385), (-6.1704098495, -1.4995140175))
        make_face()
    extrude(amount=F6_DEPTH)

    # F5 (on Front) → F7 (cut, symmetric)
    with BuildSketch(Plane.XZ):
        Circle(F5_R)
    extrude(amount=-F7_DEPTH, both=True, mode=Mode.SUBTRACT)


solid = f1.part
